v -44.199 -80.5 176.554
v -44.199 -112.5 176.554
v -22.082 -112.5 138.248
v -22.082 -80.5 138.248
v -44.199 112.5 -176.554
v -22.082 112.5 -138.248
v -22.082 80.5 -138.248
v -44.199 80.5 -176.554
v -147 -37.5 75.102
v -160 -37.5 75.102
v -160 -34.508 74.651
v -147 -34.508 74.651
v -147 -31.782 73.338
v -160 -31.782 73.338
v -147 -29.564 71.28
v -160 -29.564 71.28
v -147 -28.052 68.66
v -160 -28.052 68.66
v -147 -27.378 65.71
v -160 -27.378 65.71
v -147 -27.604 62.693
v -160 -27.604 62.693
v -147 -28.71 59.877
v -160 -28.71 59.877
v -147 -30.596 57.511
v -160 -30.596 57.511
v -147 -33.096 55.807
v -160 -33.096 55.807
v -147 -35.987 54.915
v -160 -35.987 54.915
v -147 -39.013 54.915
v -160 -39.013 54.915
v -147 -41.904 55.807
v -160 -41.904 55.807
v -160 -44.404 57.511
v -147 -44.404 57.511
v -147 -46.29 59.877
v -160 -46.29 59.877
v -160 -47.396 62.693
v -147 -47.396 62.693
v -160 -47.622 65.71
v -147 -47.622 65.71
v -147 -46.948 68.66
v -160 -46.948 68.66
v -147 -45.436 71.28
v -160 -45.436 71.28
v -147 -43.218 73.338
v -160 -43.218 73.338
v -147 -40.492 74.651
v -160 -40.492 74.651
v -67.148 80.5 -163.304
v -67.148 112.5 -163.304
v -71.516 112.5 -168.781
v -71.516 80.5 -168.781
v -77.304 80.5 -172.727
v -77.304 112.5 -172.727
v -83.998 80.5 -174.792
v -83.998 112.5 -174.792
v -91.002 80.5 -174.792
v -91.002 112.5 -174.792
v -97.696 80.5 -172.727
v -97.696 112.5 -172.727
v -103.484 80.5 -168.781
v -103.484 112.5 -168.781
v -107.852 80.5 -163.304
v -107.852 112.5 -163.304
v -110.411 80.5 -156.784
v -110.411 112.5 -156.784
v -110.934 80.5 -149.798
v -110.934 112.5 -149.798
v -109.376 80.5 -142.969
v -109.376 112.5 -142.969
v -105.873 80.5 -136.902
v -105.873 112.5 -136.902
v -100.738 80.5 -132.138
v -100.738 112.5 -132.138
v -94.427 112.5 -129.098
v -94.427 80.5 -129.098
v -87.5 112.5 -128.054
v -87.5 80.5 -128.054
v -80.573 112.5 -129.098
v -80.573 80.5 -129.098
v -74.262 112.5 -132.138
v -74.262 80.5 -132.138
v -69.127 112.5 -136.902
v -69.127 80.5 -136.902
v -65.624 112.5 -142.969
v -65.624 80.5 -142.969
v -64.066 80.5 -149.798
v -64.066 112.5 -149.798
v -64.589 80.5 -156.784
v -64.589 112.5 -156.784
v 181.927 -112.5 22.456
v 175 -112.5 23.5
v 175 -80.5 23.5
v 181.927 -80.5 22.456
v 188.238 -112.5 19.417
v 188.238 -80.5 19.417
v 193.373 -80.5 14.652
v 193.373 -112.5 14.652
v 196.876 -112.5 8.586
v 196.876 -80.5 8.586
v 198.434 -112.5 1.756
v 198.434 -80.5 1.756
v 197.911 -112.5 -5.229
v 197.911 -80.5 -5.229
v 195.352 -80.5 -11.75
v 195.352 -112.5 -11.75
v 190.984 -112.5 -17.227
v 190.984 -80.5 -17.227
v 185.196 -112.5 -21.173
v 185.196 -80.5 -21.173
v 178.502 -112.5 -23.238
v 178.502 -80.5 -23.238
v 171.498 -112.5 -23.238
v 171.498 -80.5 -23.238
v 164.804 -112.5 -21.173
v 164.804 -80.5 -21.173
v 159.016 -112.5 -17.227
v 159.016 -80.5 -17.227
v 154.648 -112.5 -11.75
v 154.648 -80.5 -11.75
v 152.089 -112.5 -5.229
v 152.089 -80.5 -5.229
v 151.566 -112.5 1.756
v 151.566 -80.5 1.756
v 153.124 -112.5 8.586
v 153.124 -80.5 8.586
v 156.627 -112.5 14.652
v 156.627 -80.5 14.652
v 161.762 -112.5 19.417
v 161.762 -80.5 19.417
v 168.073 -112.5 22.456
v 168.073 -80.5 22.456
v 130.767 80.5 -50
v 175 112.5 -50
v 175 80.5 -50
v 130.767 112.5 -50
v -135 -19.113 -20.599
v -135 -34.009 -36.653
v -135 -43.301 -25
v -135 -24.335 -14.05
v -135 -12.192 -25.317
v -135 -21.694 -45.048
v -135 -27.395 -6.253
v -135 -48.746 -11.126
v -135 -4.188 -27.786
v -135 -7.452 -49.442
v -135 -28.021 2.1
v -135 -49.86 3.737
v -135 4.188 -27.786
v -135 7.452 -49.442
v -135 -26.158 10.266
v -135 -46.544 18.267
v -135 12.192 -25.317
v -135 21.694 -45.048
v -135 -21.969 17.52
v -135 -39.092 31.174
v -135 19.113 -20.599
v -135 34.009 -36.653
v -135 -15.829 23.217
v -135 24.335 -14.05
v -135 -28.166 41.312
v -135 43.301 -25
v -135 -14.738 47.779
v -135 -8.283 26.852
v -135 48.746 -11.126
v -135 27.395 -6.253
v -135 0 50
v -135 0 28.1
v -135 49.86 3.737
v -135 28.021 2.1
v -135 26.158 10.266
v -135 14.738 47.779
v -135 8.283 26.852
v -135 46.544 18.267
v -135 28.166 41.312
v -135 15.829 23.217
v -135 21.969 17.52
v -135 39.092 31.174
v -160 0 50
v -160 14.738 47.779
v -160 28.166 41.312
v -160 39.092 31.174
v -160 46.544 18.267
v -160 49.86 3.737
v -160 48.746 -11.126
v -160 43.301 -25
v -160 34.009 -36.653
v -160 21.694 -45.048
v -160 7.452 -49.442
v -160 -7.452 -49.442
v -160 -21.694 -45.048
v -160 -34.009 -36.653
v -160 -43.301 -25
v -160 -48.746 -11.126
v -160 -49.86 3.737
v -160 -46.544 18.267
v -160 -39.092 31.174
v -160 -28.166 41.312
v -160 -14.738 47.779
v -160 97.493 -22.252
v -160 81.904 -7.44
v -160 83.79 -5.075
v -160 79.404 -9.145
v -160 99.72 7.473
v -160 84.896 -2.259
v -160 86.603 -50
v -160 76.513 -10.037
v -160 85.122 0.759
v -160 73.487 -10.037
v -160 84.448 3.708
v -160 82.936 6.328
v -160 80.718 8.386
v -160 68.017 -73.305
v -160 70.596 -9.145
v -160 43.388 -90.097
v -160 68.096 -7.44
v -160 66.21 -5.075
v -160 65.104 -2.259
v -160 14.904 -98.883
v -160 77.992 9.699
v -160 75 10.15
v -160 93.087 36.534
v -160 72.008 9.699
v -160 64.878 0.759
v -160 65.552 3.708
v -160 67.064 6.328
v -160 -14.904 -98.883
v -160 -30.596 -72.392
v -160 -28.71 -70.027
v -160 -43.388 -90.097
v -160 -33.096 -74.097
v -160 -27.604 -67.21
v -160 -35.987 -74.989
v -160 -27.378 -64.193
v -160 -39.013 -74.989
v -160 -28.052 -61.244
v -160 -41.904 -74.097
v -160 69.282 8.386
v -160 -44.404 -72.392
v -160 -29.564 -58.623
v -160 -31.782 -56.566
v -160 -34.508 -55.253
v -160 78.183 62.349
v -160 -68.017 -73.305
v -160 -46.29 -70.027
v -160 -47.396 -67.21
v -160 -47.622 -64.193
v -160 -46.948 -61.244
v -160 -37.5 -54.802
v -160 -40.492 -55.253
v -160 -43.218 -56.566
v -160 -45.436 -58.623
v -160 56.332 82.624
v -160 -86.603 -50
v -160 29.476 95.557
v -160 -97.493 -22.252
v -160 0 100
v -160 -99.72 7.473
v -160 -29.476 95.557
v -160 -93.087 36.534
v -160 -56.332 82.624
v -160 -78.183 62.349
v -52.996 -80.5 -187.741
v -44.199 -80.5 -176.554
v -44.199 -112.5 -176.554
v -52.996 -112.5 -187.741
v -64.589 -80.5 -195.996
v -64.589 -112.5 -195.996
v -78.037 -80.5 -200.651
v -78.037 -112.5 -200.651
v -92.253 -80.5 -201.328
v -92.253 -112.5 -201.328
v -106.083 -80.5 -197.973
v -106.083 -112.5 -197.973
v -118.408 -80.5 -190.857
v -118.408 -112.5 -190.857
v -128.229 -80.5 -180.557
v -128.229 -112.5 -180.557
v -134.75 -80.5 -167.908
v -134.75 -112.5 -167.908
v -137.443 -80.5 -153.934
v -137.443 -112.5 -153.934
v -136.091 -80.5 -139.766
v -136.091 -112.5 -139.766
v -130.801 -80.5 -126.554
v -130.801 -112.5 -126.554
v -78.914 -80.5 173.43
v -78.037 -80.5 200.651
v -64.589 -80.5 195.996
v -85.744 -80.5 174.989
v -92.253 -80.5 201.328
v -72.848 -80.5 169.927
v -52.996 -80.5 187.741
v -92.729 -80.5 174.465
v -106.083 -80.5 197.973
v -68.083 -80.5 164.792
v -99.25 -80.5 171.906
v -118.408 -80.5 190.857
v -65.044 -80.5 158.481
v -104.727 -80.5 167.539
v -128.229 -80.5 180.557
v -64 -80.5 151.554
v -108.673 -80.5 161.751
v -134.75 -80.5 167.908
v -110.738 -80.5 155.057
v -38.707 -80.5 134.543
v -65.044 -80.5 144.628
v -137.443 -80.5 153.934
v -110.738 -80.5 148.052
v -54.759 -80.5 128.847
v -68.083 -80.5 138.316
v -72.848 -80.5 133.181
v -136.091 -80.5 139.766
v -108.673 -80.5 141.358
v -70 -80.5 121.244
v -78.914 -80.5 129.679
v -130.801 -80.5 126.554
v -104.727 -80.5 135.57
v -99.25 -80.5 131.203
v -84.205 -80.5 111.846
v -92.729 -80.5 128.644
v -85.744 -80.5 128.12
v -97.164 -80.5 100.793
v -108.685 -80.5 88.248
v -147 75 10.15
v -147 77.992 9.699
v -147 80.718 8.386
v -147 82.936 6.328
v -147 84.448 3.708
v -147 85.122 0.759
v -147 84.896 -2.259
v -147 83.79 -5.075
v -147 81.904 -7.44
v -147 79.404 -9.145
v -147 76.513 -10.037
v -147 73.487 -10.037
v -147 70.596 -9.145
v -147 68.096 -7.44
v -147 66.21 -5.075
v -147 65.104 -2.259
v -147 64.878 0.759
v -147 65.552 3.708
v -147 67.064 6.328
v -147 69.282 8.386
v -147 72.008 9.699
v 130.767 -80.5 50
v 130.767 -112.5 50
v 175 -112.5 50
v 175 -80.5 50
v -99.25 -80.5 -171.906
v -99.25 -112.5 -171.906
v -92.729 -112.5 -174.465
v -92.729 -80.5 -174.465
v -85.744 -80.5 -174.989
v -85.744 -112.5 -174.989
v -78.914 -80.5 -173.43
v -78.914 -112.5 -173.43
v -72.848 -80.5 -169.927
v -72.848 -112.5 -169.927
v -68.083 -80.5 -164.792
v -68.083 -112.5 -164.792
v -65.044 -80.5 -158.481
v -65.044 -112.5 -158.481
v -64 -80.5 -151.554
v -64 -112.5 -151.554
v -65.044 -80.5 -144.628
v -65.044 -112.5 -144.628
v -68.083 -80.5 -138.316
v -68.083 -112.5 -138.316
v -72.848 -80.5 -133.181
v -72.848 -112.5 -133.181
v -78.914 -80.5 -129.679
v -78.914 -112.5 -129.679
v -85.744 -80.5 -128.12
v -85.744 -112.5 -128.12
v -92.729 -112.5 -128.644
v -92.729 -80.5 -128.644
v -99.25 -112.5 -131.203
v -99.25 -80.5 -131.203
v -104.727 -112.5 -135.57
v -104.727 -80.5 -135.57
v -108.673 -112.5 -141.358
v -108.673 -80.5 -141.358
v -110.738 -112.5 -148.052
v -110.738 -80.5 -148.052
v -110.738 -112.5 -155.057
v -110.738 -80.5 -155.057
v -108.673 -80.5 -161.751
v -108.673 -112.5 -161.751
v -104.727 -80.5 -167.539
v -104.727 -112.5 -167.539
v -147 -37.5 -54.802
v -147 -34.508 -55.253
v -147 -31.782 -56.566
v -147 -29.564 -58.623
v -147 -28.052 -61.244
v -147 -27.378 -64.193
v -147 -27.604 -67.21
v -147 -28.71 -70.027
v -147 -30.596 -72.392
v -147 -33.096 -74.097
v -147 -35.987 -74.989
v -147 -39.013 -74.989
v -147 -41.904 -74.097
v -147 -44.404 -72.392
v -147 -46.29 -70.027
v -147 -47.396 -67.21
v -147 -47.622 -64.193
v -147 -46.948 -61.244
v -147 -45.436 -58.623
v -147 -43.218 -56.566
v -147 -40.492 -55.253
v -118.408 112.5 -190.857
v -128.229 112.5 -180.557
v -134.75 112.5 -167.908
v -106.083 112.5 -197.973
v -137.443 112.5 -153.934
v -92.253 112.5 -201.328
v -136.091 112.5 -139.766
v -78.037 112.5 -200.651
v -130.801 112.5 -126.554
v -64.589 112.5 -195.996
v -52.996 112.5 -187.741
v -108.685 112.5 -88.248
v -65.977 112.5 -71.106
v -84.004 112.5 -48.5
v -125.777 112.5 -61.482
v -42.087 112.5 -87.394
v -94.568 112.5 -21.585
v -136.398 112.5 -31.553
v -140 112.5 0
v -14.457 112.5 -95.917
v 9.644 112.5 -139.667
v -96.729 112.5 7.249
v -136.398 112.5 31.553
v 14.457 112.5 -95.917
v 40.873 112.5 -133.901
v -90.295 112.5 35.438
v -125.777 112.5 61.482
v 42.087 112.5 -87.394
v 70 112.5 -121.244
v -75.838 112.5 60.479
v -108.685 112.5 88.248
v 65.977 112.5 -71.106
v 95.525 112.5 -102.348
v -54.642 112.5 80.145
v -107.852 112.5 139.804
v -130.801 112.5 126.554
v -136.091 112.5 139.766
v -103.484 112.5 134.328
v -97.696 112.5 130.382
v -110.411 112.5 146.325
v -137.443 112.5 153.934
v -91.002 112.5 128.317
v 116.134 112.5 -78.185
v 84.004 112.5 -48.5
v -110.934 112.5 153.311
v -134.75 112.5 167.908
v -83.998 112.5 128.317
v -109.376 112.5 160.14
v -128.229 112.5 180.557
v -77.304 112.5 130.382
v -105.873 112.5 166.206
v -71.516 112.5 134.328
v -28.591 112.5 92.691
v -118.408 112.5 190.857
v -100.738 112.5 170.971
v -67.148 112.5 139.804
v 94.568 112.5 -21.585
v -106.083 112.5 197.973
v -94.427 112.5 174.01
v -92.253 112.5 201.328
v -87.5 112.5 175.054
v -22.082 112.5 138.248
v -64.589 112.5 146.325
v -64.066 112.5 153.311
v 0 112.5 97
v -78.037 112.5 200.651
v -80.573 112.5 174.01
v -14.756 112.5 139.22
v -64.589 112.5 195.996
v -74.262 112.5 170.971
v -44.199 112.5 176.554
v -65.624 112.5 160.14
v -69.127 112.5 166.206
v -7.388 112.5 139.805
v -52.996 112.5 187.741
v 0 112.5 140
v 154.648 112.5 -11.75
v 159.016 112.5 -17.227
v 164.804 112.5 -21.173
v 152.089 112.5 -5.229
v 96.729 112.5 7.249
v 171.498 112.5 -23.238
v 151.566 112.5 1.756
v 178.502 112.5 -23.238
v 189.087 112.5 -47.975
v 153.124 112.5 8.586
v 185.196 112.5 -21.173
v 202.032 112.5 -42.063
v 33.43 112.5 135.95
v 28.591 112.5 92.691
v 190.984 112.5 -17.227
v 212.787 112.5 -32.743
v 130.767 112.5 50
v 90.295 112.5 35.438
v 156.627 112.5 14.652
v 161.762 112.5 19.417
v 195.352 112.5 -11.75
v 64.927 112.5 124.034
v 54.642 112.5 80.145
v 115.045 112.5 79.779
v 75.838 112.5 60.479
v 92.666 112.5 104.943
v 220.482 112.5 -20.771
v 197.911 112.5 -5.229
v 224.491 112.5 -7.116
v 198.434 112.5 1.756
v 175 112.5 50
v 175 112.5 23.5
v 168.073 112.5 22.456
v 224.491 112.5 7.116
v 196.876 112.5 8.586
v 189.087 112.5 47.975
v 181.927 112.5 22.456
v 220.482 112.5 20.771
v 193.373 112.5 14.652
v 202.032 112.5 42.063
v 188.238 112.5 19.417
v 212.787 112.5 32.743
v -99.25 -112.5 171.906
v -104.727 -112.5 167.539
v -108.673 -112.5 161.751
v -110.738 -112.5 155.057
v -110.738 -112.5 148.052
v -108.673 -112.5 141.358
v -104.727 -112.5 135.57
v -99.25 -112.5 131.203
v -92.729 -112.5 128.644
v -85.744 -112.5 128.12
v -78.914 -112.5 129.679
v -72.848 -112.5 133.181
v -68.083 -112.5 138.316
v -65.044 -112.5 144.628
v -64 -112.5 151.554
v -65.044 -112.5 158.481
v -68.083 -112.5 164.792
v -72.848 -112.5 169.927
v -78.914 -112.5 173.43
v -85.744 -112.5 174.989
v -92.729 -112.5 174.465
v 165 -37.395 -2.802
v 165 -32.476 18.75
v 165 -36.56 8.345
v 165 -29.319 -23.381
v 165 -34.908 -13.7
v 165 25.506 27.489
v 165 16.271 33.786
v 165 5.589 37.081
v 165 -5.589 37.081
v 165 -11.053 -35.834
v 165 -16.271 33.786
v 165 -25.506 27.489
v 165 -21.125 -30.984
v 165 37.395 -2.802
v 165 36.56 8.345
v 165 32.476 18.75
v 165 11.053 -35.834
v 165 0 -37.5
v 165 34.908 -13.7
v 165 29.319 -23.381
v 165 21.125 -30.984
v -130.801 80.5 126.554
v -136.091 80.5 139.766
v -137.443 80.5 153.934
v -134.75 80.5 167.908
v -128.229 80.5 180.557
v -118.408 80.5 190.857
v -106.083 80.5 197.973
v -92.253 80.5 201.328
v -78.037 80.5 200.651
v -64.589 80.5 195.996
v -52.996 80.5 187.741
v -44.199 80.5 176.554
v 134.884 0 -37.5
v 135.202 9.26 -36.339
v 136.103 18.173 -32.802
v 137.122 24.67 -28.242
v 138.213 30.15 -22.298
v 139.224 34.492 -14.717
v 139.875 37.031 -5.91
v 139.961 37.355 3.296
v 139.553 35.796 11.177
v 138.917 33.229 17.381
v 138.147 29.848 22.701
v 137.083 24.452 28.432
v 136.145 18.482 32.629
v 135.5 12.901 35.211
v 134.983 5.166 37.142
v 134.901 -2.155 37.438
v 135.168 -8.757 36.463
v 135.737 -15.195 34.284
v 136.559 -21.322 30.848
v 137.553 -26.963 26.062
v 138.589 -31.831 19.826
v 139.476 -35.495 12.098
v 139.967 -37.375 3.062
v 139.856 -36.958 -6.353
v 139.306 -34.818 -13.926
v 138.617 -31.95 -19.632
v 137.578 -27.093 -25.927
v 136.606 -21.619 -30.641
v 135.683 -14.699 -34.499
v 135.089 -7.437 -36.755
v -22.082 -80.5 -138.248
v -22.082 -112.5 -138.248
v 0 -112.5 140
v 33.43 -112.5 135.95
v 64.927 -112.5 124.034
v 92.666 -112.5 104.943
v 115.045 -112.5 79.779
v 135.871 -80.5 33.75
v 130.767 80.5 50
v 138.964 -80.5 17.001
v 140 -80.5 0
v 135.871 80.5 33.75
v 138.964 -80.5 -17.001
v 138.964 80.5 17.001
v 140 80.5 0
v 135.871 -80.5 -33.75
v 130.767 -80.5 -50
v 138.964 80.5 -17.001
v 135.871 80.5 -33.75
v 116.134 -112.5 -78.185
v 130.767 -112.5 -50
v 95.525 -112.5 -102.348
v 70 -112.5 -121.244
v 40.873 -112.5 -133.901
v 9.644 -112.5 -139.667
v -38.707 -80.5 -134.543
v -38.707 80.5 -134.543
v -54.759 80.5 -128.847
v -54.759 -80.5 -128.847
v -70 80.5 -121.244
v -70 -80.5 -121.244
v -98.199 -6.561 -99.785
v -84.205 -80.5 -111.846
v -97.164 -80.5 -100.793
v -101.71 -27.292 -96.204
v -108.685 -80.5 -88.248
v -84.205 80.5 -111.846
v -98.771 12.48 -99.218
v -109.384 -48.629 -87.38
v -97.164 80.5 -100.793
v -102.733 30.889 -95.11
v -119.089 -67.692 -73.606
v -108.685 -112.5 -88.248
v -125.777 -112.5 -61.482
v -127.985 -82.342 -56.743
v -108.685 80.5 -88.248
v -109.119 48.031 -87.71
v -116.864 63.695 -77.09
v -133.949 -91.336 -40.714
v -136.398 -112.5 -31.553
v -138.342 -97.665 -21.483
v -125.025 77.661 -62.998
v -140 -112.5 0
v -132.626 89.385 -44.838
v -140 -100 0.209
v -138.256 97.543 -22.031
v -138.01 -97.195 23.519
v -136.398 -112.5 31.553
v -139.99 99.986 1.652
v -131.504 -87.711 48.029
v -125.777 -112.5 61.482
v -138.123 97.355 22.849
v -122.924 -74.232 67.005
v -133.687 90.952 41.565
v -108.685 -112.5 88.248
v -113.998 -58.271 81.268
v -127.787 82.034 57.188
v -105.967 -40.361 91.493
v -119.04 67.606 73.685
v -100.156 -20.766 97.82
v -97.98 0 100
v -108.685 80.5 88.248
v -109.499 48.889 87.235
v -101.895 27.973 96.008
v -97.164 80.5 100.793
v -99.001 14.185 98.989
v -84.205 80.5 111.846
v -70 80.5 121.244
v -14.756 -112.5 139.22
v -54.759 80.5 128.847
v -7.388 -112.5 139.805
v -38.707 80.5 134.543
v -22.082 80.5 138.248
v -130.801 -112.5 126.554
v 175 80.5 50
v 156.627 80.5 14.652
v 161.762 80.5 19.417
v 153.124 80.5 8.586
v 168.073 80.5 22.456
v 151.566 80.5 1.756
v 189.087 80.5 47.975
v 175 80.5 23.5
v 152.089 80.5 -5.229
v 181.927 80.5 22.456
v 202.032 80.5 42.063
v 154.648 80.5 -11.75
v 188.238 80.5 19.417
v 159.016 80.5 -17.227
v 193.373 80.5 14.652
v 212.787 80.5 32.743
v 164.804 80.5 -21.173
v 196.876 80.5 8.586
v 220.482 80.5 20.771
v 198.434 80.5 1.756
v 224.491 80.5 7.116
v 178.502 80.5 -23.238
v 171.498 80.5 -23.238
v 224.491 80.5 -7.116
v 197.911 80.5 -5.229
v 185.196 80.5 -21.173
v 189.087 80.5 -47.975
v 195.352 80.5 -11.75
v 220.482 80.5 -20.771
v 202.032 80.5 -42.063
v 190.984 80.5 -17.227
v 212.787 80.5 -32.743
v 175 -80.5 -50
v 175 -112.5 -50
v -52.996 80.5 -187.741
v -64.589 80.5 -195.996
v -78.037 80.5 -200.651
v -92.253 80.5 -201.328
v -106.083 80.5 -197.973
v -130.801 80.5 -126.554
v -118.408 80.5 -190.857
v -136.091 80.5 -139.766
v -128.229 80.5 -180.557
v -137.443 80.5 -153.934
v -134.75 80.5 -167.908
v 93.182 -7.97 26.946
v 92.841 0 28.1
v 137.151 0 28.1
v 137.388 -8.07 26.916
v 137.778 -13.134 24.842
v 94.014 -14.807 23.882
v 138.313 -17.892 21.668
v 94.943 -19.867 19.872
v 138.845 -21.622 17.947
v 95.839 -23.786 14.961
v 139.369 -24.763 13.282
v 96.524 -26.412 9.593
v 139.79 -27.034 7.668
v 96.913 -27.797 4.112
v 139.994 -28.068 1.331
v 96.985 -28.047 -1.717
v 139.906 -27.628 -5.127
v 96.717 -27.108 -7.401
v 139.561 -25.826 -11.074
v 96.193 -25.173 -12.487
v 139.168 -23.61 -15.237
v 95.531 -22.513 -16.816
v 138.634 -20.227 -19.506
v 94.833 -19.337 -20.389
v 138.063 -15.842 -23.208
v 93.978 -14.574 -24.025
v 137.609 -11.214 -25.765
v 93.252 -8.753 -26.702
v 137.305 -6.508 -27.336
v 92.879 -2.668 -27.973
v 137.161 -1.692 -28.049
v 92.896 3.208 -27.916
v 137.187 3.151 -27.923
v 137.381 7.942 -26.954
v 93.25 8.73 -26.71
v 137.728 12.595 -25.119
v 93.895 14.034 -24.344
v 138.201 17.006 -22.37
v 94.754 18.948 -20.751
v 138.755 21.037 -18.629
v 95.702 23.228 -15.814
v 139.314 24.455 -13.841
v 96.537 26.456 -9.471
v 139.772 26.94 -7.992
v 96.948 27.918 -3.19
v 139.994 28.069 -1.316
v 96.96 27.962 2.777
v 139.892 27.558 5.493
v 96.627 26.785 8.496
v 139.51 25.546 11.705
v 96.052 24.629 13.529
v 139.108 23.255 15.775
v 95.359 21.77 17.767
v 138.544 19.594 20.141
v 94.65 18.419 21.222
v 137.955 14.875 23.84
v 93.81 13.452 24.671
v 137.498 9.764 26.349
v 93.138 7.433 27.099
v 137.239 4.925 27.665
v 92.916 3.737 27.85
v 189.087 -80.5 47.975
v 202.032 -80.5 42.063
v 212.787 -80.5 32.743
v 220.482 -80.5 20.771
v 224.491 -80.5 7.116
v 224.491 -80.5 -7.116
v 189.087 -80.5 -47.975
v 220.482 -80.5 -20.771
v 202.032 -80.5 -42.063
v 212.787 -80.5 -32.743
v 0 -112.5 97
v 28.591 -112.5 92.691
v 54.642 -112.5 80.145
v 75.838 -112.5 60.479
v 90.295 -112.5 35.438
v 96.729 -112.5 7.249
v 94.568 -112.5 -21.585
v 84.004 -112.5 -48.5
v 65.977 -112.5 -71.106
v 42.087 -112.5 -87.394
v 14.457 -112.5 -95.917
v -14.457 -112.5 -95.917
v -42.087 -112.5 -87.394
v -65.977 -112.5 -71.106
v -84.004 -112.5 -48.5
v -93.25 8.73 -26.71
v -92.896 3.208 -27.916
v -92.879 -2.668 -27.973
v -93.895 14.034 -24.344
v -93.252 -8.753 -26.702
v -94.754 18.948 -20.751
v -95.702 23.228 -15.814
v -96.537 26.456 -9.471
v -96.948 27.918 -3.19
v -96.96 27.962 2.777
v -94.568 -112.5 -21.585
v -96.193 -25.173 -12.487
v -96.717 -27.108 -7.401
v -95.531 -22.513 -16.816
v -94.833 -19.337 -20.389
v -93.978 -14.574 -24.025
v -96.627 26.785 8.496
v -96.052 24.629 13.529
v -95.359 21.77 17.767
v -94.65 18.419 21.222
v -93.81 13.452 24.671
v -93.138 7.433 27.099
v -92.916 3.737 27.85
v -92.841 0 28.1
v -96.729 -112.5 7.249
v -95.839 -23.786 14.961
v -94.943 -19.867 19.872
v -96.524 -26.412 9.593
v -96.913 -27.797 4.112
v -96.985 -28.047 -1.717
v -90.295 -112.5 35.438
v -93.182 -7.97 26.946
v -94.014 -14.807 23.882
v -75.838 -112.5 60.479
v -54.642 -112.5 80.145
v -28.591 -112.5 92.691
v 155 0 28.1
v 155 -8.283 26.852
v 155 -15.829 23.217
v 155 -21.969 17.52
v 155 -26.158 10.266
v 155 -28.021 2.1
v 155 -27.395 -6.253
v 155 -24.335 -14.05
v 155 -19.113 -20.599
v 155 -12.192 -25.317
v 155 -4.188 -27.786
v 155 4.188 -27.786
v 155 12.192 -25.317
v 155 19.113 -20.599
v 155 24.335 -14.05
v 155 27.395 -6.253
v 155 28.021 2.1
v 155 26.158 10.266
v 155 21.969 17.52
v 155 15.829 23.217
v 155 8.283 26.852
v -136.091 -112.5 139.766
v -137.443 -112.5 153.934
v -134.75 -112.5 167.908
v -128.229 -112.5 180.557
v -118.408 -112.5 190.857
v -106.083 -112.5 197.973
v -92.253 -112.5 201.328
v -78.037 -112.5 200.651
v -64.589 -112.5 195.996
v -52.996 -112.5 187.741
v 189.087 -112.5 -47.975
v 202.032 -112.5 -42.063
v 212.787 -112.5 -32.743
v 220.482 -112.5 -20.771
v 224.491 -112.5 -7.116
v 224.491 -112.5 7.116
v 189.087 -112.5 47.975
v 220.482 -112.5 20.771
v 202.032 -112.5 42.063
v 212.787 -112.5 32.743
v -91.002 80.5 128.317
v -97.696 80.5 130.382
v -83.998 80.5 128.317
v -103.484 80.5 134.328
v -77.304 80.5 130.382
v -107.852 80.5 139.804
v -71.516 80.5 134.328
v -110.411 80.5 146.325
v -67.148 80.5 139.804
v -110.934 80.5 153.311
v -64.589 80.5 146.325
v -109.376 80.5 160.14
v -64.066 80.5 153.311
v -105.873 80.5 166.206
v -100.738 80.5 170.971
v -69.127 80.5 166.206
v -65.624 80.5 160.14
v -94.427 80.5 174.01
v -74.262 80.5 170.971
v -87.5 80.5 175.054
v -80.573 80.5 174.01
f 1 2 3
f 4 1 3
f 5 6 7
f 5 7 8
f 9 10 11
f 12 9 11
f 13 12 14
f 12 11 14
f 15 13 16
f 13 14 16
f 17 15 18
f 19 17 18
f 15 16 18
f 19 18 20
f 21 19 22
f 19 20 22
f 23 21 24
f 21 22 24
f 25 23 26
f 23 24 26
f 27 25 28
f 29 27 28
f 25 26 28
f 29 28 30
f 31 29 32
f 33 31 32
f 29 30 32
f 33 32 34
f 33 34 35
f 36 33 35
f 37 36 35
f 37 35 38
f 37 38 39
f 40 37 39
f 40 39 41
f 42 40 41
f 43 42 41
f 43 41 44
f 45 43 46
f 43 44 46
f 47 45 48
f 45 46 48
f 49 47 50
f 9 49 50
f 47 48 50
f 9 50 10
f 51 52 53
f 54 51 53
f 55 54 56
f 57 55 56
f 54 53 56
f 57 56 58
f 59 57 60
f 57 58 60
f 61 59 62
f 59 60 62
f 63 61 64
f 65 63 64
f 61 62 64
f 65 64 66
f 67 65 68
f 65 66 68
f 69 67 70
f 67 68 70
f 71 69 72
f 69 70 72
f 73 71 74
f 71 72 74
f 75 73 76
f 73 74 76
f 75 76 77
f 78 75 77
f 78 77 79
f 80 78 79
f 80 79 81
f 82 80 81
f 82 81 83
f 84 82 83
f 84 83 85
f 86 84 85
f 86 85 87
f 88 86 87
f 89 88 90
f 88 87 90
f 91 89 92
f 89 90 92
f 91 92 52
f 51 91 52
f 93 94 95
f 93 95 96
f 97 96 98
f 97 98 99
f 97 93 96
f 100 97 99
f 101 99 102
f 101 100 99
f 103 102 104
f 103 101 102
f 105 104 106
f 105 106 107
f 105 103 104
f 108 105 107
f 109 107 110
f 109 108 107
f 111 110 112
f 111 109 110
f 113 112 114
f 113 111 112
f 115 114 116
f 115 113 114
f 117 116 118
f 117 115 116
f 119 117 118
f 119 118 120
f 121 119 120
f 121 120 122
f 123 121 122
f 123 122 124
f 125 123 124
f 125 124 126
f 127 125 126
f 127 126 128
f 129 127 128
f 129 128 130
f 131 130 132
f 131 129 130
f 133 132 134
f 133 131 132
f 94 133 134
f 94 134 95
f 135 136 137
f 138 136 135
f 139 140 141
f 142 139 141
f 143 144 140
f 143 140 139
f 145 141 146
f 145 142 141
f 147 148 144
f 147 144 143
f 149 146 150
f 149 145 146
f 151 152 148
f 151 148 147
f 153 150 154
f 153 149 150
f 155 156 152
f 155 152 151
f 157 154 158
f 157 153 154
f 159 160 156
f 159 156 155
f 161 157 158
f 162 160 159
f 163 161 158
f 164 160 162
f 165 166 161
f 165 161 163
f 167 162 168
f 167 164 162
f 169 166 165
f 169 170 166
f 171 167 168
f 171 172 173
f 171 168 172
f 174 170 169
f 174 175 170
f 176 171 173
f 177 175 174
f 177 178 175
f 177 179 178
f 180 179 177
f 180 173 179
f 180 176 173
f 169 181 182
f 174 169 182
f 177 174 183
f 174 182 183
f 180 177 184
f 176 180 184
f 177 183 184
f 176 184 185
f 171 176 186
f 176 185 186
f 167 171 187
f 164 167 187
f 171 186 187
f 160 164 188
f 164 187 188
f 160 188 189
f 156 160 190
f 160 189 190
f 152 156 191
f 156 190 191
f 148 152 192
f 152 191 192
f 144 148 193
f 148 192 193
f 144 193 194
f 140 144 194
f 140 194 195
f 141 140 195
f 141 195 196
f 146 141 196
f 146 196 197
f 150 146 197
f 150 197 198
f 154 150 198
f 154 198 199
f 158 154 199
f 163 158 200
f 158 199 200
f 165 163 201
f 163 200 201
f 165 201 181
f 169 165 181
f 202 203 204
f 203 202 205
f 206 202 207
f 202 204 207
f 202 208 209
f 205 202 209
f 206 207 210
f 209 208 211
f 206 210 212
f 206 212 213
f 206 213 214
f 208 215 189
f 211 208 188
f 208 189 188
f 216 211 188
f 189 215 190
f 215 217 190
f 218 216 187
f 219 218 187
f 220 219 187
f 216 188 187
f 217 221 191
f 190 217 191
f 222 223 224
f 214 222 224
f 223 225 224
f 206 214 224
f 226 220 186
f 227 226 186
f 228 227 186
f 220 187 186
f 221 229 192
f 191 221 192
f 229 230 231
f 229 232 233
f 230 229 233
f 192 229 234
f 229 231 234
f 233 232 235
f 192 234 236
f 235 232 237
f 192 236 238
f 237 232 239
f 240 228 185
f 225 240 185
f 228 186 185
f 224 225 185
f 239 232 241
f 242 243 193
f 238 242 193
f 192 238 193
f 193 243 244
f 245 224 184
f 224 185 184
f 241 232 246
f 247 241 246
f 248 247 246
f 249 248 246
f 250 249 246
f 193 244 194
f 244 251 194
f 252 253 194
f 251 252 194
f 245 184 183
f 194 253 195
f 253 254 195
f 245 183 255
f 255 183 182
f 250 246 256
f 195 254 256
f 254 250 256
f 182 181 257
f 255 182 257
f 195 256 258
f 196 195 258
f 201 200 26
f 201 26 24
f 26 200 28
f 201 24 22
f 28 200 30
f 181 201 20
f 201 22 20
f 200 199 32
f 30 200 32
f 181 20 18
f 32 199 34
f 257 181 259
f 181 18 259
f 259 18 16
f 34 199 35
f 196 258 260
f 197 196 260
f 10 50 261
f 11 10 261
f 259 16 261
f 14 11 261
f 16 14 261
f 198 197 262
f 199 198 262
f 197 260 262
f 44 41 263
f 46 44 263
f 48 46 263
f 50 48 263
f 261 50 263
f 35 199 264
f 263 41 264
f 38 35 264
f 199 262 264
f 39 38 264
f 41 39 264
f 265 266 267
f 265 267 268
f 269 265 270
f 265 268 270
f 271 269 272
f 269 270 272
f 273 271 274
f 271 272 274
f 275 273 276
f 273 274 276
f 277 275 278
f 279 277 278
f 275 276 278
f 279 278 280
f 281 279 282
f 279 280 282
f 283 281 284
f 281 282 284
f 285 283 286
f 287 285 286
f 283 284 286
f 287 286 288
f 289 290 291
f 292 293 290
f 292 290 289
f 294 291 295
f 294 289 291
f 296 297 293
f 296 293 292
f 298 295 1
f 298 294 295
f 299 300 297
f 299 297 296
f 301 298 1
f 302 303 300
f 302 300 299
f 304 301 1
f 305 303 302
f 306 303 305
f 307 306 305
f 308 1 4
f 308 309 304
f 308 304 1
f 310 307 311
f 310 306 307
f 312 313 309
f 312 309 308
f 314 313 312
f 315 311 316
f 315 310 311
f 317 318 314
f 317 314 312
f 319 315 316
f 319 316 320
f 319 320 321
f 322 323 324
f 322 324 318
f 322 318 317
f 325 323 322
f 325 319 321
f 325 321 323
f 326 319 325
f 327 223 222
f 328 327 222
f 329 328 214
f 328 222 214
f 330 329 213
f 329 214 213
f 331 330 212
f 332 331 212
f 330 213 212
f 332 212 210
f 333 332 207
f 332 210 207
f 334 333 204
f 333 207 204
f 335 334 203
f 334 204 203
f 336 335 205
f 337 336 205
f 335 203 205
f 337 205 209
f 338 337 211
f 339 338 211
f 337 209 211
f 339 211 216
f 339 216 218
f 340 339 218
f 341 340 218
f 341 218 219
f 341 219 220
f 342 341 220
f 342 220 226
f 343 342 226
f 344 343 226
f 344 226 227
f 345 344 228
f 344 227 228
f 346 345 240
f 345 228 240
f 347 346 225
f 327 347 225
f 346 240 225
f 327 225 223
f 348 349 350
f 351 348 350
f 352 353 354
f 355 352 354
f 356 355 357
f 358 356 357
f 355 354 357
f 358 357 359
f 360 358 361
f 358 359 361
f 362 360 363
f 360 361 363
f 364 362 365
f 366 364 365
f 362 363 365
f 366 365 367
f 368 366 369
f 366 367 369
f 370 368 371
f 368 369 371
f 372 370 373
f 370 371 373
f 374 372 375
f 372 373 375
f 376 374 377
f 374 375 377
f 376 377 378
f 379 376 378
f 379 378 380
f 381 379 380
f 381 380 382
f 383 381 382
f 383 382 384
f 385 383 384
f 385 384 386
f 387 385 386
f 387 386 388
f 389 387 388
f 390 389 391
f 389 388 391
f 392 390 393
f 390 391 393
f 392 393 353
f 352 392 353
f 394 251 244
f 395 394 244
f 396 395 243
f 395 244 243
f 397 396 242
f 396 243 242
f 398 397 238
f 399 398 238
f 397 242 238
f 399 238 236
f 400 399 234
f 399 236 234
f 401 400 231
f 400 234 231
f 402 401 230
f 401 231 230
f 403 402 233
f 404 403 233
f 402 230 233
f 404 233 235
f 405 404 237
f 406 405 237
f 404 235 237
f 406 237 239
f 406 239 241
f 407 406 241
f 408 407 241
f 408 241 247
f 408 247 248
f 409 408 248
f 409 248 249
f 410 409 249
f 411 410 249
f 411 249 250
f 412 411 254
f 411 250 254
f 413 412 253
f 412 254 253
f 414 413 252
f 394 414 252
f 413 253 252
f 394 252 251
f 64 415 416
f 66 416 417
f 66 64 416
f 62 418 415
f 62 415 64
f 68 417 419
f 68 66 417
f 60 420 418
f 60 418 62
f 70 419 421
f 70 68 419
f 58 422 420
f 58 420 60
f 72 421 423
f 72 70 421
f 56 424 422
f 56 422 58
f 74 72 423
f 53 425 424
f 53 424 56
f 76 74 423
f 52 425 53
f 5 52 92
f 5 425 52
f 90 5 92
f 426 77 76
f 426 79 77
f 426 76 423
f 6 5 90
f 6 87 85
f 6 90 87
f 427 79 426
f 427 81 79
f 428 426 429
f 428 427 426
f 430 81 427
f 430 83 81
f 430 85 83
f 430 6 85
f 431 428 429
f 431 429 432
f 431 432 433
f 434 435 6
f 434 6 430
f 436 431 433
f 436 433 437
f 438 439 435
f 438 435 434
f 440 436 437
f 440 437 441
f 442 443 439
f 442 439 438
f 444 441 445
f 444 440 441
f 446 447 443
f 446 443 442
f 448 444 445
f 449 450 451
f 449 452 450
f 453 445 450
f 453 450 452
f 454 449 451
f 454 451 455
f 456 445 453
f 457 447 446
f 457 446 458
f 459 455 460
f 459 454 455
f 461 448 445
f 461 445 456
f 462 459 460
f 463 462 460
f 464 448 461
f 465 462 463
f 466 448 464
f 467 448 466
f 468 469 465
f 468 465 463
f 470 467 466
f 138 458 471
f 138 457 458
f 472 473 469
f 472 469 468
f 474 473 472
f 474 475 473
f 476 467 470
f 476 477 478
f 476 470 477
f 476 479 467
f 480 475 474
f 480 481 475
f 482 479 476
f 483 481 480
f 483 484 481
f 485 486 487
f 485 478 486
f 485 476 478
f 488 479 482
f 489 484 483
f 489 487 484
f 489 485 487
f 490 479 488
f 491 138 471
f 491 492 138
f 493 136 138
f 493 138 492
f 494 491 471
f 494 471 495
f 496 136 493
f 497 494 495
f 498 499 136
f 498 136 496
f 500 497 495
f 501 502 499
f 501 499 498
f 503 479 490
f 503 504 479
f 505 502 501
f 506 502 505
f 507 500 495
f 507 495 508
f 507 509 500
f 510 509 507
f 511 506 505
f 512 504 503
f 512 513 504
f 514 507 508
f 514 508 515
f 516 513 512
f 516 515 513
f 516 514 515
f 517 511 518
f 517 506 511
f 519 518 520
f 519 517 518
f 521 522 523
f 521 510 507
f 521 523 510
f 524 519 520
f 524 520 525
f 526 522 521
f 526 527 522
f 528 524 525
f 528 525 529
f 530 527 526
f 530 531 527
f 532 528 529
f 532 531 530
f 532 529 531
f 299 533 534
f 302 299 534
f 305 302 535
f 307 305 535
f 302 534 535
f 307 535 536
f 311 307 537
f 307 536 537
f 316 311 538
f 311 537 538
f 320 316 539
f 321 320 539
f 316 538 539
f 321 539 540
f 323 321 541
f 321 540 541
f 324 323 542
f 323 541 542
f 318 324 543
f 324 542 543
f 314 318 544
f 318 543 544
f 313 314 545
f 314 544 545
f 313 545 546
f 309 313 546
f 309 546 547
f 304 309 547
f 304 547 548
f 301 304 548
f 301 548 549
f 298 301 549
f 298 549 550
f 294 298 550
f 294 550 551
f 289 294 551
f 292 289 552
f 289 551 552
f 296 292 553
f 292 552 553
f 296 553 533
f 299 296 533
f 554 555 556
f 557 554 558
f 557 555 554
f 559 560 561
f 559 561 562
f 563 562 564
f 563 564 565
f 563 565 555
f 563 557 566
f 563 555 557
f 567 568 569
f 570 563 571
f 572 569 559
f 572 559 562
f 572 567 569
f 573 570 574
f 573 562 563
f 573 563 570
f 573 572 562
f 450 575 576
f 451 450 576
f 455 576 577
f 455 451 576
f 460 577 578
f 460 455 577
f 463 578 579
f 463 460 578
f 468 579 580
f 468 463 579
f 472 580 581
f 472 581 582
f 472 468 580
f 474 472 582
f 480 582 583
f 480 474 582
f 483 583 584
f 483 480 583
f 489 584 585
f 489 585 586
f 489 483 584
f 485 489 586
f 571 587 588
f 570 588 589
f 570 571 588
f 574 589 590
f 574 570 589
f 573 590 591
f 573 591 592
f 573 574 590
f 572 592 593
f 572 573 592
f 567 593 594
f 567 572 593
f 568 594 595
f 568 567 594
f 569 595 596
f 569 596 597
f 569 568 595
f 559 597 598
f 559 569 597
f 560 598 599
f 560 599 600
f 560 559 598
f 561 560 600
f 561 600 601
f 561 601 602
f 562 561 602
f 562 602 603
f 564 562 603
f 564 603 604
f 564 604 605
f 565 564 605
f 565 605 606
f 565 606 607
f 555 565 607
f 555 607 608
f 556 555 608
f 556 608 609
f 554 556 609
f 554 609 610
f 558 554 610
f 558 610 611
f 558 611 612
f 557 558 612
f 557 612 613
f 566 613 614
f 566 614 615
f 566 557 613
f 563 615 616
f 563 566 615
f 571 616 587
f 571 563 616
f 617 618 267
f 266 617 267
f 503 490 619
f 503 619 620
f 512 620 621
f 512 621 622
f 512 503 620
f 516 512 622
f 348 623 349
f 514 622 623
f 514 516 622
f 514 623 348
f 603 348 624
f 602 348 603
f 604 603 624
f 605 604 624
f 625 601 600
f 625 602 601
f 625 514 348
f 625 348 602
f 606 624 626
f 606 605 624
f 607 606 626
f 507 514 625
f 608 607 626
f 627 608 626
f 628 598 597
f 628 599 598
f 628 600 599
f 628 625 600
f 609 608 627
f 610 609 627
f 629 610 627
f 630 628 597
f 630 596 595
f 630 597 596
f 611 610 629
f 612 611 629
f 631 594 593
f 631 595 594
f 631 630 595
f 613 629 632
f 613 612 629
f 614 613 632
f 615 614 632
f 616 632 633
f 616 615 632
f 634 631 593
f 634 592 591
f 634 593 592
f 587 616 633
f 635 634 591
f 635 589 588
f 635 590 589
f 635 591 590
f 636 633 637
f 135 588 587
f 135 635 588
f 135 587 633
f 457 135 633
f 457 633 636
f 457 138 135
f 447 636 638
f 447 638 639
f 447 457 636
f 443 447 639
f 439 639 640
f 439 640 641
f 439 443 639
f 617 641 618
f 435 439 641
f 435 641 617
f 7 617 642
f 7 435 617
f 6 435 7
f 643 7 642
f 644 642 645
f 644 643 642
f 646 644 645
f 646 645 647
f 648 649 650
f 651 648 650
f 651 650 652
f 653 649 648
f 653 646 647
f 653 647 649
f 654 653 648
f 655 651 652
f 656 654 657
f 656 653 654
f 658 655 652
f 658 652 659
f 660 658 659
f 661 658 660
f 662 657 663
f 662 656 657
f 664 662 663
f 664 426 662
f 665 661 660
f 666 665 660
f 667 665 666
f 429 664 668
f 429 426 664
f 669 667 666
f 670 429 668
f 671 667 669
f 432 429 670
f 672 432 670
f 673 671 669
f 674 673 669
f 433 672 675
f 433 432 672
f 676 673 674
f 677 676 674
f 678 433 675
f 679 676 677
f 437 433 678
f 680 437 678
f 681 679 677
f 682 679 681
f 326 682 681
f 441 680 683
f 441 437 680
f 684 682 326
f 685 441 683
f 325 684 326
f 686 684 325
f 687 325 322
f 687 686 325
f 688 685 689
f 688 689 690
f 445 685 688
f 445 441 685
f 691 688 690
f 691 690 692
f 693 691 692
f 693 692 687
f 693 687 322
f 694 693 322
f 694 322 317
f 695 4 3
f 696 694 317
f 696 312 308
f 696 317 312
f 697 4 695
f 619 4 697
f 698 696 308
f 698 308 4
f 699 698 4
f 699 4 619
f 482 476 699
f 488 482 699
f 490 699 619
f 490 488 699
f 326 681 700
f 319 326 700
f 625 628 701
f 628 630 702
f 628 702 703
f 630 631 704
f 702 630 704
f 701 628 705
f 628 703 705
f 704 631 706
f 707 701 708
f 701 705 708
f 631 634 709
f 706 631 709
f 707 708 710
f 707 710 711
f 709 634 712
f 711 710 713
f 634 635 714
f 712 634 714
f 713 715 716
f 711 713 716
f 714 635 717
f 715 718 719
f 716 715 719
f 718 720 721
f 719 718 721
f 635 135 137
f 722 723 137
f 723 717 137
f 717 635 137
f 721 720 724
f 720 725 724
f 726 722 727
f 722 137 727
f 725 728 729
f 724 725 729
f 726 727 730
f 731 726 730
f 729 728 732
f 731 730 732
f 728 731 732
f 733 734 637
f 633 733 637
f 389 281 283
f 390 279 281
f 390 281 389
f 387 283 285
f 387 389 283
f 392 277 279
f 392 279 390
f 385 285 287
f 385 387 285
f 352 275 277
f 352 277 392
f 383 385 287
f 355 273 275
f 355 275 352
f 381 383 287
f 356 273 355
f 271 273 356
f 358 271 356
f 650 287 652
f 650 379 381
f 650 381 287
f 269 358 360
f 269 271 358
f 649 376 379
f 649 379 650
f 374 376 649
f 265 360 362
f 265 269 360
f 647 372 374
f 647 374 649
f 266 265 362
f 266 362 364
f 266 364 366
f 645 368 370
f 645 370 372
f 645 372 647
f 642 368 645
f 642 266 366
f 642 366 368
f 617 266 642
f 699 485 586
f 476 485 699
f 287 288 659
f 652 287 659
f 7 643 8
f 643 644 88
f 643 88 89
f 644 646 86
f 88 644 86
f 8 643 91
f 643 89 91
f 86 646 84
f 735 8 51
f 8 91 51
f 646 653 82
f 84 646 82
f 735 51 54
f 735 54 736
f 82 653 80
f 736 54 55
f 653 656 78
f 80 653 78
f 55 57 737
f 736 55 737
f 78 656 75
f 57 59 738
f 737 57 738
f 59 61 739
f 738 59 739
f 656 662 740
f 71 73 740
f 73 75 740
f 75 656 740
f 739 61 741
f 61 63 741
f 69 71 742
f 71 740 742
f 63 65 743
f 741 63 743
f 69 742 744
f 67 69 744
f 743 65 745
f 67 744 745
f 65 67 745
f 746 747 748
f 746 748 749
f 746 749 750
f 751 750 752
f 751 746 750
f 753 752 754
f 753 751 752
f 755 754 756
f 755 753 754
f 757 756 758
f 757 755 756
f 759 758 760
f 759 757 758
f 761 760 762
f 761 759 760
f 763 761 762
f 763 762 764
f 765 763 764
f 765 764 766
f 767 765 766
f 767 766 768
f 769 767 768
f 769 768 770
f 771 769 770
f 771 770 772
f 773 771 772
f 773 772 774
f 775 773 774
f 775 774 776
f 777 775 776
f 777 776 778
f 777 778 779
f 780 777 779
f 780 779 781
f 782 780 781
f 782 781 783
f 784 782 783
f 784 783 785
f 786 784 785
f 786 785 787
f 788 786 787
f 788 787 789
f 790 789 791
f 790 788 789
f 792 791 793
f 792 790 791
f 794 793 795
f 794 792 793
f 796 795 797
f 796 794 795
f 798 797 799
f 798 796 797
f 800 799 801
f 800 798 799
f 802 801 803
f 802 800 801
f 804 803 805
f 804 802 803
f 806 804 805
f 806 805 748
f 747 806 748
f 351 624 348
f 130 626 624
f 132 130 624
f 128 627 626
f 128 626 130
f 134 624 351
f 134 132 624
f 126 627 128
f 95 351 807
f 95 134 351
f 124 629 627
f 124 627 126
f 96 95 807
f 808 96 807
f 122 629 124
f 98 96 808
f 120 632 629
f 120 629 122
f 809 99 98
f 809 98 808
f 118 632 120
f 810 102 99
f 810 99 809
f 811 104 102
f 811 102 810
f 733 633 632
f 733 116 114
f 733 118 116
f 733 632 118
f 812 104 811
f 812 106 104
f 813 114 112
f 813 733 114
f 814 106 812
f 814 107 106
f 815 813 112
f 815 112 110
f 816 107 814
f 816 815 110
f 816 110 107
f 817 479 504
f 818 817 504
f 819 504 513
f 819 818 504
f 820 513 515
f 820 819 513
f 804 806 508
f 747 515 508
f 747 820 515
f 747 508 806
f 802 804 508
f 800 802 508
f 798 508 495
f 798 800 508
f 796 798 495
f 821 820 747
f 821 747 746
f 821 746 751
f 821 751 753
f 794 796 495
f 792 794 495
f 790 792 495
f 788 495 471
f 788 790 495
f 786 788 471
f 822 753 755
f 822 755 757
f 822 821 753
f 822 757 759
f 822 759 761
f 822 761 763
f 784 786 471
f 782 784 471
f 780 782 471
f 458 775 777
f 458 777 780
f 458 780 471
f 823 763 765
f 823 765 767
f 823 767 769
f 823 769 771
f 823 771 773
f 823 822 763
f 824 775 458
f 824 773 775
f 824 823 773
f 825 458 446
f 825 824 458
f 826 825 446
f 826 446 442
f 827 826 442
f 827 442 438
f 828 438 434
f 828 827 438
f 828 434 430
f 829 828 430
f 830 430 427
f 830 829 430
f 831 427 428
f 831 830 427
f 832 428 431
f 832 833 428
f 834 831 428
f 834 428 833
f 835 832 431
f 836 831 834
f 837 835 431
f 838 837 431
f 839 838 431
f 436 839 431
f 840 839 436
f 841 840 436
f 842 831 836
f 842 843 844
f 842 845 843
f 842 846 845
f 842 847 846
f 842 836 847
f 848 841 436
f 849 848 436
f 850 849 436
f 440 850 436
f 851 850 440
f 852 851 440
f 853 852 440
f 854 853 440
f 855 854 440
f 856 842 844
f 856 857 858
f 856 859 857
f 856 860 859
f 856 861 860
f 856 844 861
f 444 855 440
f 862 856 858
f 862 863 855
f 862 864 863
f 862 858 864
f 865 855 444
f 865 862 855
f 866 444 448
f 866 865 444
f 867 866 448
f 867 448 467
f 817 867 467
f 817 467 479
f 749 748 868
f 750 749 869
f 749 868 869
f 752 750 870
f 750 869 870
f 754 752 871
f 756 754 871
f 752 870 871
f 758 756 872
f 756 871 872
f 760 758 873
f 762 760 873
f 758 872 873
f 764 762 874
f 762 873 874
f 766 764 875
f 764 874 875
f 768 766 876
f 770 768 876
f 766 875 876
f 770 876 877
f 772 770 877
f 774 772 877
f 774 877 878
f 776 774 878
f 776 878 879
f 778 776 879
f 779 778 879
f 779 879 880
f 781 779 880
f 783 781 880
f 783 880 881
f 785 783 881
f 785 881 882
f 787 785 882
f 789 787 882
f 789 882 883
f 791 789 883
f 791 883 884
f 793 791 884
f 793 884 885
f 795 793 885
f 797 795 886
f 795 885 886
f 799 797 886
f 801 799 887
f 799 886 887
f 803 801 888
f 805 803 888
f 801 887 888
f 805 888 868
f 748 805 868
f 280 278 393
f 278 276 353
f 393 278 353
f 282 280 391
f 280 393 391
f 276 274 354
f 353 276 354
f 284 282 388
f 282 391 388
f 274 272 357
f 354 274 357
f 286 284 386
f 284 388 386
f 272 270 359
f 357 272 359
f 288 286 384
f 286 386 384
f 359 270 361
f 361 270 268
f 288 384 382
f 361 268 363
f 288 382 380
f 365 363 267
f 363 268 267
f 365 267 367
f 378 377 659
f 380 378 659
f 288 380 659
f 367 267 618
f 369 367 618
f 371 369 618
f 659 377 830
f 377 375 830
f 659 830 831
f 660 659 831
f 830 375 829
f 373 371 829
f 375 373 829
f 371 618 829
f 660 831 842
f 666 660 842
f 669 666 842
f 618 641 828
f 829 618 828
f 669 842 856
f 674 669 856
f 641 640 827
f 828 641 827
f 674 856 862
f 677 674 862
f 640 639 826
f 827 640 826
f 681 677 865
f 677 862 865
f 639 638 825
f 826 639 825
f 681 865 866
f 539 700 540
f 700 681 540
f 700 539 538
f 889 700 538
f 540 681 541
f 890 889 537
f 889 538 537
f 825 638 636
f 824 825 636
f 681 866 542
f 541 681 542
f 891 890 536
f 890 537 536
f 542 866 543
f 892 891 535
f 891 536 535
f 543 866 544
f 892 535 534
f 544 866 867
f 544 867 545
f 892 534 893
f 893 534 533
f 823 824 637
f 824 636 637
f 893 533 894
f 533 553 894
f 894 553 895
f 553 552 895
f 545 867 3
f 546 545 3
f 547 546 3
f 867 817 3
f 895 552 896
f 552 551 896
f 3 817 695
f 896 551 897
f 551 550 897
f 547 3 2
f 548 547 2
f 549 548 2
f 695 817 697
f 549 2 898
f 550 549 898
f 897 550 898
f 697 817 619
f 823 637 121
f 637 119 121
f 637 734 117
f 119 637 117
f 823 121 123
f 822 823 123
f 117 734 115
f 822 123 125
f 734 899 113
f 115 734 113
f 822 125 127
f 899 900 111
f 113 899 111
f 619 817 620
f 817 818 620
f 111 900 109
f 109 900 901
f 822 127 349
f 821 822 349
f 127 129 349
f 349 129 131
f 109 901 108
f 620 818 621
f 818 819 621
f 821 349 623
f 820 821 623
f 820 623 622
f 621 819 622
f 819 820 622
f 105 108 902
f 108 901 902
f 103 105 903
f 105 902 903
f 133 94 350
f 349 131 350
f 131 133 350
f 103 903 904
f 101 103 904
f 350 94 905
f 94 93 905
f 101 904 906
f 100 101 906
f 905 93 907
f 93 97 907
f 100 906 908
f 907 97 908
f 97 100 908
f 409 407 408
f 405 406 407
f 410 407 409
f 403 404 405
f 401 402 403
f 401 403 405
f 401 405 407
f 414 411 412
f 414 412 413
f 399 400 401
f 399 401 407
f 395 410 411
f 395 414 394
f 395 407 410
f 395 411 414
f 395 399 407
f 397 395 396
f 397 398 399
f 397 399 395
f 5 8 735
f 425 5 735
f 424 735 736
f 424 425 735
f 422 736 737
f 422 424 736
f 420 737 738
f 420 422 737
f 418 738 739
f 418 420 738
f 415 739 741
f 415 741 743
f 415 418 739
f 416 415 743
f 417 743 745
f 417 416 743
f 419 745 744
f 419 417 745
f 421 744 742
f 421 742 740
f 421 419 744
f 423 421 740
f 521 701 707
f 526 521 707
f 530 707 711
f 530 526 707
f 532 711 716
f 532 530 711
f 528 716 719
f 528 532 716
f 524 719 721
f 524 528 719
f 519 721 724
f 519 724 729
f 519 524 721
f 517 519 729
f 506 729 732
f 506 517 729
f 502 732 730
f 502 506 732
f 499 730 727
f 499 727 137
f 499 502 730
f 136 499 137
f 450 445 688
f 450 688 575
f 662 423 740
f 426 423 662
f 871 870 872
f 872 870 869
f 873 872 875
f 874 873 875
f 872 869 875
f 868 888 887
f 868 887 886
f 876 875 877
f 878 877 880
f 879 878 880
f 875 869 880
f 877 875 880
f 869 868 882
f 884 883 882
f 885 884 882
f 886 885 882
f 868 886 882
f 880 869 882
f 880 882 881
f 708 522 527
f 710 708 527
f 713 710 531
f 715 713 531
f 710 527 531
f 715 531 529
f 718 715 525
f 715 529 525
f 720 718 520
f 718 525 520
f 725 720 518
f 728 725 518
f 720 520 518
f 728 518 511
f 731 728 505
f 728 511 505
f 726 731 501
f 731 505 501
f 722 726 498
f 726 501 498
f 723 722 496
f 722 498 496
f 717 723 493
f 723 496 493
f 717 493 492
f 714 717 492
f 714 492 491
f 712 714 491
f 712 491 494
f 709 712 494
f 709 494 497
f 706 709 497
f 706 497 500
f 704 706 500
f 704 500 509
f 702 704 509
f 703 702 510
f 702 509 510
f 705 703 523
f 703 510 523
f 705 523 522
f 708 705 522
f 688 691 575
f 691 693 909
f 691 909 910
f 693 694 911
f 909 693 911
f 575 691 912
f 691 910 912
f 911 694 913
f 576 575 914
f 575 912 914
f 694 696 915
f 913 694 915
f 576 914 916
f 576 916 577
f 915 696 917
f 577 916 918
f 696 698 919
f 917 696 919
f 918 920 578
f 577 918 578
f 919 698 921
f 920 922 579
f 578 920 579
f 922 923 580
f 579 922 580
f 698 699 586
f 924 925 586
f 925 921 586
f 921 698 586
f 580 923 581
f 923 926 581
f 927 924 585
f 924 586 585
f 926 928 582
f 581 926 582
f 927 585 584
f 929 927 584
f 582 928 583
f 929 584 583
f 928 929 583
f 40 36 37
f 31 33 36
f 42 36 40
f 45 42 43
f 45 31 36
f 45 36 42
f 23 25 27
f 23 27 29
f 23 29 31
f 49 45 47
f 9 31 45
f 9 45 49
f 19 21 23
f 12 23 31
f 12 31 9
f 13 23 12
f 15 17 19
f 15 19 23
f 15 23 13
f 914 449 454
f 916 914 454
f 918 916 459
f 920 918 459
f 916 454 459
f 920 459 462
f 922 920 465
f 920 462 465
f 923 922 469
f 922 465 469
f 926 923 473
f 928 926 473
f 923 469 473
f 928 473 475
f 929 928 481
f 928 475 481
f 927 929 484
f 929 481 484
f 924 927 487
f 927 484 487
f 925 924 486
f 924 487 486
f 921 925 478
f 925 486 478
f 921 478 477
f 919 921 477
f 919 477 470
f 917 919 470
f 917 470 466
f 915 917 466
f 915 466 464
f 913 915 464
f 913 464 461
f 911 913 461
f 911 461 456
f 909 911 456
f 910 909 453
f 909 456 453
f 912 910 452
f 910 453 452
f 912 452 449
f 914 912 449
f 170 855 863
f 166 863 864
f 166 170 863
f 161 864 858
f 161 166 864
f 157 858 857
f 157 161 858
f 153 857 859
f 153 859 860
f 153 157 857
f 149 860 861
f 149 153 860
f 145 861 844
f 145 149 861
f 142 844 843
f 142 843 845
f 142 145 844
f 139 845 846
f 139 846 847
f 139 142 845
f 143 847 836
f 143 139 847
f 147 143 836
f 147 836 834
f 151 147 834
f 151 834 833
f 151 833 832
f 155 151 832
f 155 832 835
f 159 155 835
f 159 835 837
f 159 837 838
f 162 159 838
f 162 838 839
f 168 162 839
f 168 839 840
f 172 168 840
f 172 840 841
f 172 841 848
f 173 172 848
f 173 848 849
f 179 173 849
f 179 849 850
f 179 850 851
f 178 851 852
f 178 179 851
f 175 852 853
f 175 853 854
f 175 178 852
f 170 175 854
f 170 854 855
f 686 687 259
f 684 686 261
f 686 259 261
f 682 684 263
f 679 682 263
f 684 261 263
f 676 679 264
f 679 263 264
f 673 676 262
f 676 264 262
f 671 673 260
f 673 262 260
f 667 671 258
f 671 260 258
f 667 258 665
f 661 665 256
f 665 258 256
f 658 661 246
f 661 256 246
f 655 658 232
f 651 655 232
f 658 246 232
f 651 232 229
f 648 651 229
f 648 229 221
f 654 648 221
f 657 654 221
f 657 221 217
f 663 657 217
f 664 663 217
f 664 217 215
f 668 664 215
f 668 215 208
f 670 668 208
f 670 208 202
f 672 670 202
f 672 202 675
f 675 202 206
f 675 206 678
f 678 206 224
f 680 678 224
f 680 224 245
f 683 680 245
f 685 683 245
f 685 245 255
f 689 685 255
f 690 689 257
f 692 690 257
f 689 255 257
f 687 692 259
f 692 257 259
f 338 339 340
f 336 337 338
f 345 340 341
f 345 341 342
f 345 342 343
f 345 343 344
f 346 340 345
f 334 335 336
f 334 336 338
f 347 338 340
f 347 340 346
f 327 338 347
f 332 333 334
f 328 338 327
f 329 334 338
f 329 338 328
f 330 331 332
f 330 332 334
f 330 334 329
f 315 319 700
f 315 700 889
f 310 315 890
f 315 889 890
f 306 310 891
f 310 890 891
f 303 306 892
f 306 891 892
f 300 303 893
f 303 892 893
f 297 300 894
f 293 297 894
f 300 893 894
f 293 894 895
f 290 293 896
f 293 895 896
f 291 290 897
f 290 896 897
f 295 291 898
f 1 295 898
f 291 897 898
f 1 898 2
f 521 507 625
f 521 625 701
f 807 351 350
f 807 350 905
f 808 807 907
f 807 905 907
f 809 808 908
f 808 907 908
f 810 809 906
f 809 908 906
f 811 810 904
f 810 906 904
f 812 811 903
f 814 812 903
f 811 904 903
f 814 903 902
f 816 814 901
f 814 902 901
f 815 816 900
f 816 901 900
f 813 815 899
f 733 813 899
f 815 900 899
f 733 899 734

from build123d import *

# Parameters (mm, degrees)
SKETCH1_R                = 140
SKETCH1_R_2              = 97
BOSS_EXTRUDE1_DEPTH      = 112.5
SKETCH2_R                = 23.5
BOSS_EXTRUDE2_DEPTH      = 32
CIRPATTERN1_COUNT        = 3
MIRROR1_COPY_1_SKETCH_R  = 23.5
MIRROR1_COPY_1_DEPTH     = 32
MIRROR1_COPY_2_SKETCH_R  = 23.5
MIRROR1_COPY_2_DEPTH     = 32
SKETCH3_R                = 28.1
CUT_EXTRUDE1_DEPTH       = 310
BOSS_EXTRUDE3_REACH      = 450.894
BOSS_EXTRUDE3_END_RADIUS = 140
SKETCH4_R                = 100
SKETCH5_R                = 50
CUT_EXTRUDE2_DEPTH       = 25
SKETCH6_R                = 10.15
CUT_EXTRUDE3_DEPTH       = 13
BOSS_EXTRUDE4_REACH      = 400.629
BOSS_EXTRUDE4_END_RADIUS = 140
SKETCH7_R                = 37.5
SKETCH7_R_2              = 28.1
SKETCH8_R                = 37.5
BOSS_EXTRUDE5_DEPTH      = 10


with BuildPart() as part:
    # Sketch1 → Boss-Extrude1 (new, symmetric)
    with BuildSketch(Plane(origin=(0, 0, 0), x_dir=(1, 0, 0), z_dir=(0, 1, 0))):
        with Locations(Location((0, 0, 0), (0, 0, 270))):
            Circle(SKETCH1_R)
        with Locations(Location((0, 0, 0), (0, 0, 270))):
            Circle(SKETCH1_R_2, mode=Mode.SUBTRACT)
    extrude(amount=BOSS_EXTRUDE1_DEPTH, both=True)

    # Sketch2 → Boss-Extrude2 (add)
    with BuildSketch(Plane(origin=(0, 112.5, 0), x_dir=(1, 0, 0), z_dir=(0, 1, 0))):
        with BuildLine():
            ThreePointArc((175, -50), (225, 0), (175, 50))
            Line((175, 50), (130.766968306, 50))
            ThreePointArc((130.766968306, 50), (137.672392953, 25.42267135), (140, 0))
            ThreePointArc((140, 0), (137.672392953, -25.42267135), (130.766968306, -50))
            Line((130.766968306, -50), (175, -50))
        make_face()
        with Locations(Location((175, 0, 0), (0, 0, 270))):
            Circle(SKETCH2_R, mode=Mode.SUBTRACT)
    boss_extrude2 = extrude(amount=-BOSS_EXTRUDE2_DEPTH)

    # CirPattern1: Boss-Extrude2 ×3 about axis
    cirpattern1_axis = Axis((0, 0, 0), (0, 1, 0))
    for i in range(1, CIRPATTERN1_COUNT):
        add(boss_extrude2.rotate(cirpattern1_axis, i * 360 / CIRPATTERN1_COUNT))

    # Mirror1: Boss-Extrude2 across plane
    add(boss_extrude2.mirror(Plane.ZX))

    # Mirror1 copy 1 sketch → Mirror1 copy 1 (add)
    with BuildSketch(Plane(origin=(0, -112.5, 0), x_dir=(-0.4999999999999998, 0, -0.8660254037844387), z_dir=(0, -1, 0))):
        with BuildLine():
            ThreePointArc((175, 50), (225, 0), (175, -50))
            Line((175, -50), (130.766968306, -50))
            ThreePointArc((130.766968306, -50), (137.672392953, -25.42267135), (140, 0))
            ThreePointArc((140, 0), (137.672392953, 25.42267135), (130.766968306, 50))
            Line((130.766968306, 50), (175, 50))
        make_face()
        with Locations((175, 0)):
            Circle(MIRROR1_COPY_1_SKETCH_R, mode=Mode.SUBTRACT)
    extrude(amount=-MIRROR1_COPY_1_DEPTH)

    # Mirror1 copy 2 sketch → Mirror1 copy 2 (add)
    with BuildSketch(Plane(origin=(0, -112.5, 0), x_dir=(-0.5000000000000004, 0, 0.8660254037844384), z_dir=(0, -1, 0))):
        with BuildLine():
            ThreePointArc((175, 50), (225, 0), (175, -50))
            Line((175, -50), (130.766968306, -50))
            ThreePointArc((130.766968306, -50), (137.672392953, -25.42267135), (140, 0))
            ThreePointArc((140, 0), (137.672392953, 25.42267135), (130.766968306, 50))
            Line((130.766968306, 50), (175, 50))
        make_face()
        with Locations((175, 0)):
            Circle(MIRROR1_COPY_2_SKETCH_R, mode=Mode.SUBTRACT)
    extrude(amount=-MIRROR1_COPY_2_DEPTH)

    # Sketch3 → Cut-Extrude1 (cut)
    with BuildSketch(Plane(origin=(-160, 0, 0), x_dir=(0, 0, -1), z_dir=(1, 0, 0))):
        with Locations(Location((0, 0, 0), (0, 0, 180))):
            Circle(SKETCH3_R)
    extrude(amount=CUT_EXTRUDE1_DEPTH, mode=Mode.SUBTRACT)

    # Boss-Extrude3: up to this cylinder (the profile starts outside it)
    boss_extrude3_end = Plane(origin=(0, 0, 0), z_dir=(0, -1, 0)) * Cylinder(BOSS_EXTRUDE3_END_RADIUS, 1182.788, mode=Mode.PRIVATE)
    # Sketch4 → Boss-Extrude3 (add, up to the surface)
    with BuildSketch(Plane(origin=(-160, 0, 0), x_dir=(0, 0, -1), z_dir=(1, 0, 0)), mode=Mode.PRIVATE) as boss_extrude3_sk1:
        with Locations(Location((0, 0, 0), (0, 0, 180))):
            Circle(SKETCH4_R)
    boss_extrude3_tool1 = extrude(boss_extrude3_sk1.sketch, amount=BOSS_EXTRUDE3_REACH, mode=Mode.PRIVATE) - boss_extrude3_end
    add(boss_extrude3_tool1.solids().sort_by_distance((-160, 0, 0))[0])

    # Sketch5 → Cut-Extrude2 (cut)
    with BuildSketch(Plane.ZY.offset(160)):
        Circle(SKETCH5_R)
    extrude(amount=-CUT_EXTRUDE2_DEPTH, mode=Mode.SUBTRACT)

    # Sketch6 → Cut-Extrude3 (cut)
    with BuildSketch(Plane.ZY.offset(160)):
        with Locations((0, 75)):
            Circle(SKETCH6_R)
        with Locations((64.951905284, -37.5)):
            Circle(SKETCH6_R)
        with Locations((-64.951905284, -37.5)):
            Circle(SKETCH6_R)
    extrude(amount=-CUT_EXTRUDE3_DEPTH, mode=Mode.SUBTRACT)

    # Boss-Extrude4: up to this cylinder (the profile starts outside it)
    boss_extrude4_end = Plane(origin=(0, 0, 0), z_dir=(0, -1, 0)) * Cylinder(BOSS_EXTRUDE4_END_RADIUS, 1082.258, mode=Mode.PRIVATE)
    # Sketch7 → Boss-Extrude4 (add, up to the surface)
    with BuildSketch(Plane(origin=(165, 0, 0), x_dir=(0, 0, -1), z_dir=(1, 0, 0)), mode=Mode.PRIVATE) as boss_extrude4_sk1:
        Circle(SKETCH7_R)
        with Locations(Location((0, 0, 0), (0, 0, 180))):
            Circle(SKETCH7_R_2, mode=Mode.SUBTRACT)
    boss_extrude4_tool1 = extrude(boss_extrude4_sk1.sketch, amount=-BOSS_EXTRUDE4_REACH, mode=Mode.PRIVATE) - boss_extrude4_end
    add(boss_extrude4_tool1.solids().sort_by_distance((165, 0, 36.43934))[0])

    # Sketch8 → Boss-Extrude5 (add)
    with BuildSketch(Plane(origin=(165, 0, 0), x_dir=(0, 0, -1), z_dir=(1, 0, 0))):
        Circle(SKETCH8_R)
    extrude(amount=-BOSS_EXTRUDE5_DEPTH)


solid = part.part
